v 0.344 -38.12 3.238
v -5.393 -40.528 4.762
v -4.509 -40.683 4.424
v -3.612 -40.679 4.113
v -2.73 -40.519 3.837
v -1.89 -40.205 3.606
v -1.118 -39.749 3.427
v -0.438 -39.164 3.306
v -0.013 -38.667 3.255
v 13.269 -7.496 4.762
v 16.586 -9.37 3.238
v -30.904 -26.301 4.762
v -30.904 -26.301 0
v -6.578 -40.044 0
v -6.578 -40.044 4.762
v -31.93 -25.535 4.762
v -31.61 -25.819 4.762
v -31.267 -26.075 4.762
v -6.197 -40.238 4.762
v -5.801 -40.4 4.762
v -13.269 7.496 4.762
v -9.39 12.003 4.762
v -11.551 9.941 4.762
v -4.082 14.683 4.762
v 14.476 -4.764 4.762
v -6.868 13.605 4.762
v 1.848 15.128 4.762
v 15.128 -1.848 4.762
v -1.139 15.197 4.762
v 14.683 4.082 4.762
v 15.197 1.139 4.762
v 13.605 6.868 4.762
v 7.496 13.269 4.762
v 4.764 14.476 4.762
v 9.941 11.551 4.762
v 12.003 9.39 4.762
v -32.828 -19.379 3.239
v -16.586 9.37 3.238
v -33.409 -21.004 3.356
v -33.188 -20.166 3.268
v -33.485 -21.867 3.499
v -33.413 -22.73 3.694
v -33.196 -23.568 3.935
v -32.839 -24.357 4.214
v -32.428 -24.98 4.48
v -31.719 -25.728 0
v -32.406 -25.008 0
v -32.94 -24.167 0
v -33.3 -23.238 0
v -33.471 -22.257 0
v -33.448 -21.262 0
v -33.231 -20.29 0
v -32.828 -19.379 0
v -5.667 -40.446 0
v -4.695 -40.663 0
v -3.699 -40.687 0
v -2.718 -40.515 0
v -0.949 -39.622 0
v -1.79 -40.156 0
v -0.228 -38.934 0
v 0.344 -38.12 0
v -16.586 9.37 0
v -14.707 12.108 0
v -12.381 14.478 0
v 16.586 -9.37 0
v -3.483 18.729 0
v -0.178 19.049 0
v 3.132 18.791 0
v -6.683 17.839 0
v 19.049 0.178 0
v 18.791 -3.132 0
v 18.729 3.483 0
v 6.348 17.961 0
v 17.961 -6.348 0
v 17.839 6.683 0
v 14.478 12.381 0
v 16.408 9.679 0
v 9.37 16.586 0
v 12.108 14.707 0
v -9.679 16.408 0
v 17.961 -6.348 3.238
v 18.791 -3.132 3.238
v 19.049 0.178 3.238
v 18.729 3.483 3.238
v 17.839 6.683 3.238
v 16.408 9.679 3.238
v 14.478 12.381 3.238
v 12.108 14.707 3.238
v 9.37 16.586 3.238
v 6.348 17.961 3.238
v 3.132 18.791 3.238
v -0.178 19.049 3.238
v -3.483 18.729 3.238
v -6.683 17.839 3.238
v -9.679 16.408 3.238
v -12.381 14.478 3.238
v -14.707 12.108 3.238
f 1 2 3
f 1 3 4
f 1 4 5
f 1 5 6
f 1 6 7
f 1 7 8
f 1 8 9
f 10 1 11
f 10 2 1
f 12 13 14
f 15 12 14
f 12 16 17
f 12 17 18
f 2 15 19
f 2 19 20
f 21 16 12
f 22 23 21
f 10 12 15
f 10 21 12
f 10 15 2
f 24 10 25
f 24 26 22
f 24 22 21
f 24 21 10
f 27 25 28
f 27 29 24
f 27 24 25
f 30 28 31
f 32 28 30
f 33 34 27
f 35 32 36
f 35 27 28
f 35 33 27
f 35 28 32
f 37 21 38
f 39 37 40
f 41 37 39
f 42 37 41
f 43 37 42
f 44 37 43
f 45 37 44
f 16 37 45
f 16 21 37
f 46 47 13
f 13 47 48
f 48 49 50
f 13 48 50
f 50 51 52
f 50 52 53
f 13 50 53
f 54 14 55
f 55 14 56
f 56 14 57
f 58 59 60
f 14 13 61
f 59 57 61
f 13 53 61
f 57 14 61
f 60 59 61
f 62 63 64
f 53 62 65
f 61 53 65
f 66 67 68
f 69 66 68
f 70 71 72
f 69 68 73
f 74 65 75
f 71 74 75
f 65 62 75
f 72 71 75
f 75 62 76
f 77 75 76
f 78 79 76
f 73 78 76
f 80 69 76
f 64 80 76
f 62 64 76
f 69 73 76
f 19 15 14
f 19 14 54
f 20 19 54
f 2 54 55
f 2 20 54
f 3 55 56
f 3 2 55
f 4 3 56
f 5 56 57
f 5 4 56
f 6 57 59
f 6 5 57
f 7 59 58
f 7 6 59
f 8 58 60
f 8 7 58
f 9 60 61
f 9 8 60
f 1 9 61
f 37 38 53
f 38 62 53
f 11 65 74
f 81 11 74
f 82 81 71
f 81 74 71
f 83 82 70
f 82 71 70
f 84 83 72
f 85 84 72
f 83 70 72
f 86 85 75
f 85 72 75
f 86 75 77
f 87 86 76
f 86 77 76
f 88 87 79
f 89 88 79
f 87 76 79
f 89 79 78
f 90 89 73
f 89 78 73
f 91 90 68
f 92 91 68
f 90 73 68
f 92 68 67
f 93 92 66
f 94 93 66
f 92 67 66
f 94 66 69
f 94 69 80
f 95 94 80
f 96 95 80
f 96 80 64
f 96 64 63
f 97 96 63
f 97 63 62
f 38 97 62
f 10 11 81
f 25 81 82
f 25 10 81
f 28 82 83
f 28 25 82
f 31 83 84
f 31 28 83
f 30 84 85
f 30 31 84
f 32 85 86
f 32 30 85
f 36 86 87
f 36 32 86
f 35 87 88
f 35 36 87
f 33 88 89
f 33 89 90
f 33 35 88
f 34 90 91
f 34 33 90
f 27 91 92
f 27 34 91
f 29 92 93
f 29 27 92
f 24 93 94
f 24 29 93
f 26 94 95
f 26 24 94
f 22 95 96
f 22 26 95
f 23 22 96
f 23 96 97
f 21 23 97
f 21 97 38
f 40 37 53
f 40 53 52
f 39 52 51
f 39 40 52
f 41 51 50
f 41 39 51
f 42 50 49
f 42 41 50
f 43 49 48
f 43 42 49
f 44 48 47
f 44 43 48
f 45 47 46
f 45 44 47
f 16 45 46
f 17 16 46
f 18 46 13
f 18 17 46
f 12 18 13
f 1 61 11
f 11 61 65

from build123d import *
from OCP.BRepFilletAPI import BRepFilletAPI_MakeChamfer

# Parameters (mm, degrees)
BOSS_EXTRUDE1_DEPTH = 4.7625
CHAMFER1_SIZE       = 1.524
CHAMFER1_SIZE2      = 3.81
FILLET1_R           = 5.08


with BuildPart() as part:
    # Sketch1 → Boss-Extrude1 (new body)
    with BuildSketch(Plane.XY):
        with BuildLine():
            Line((-16.586093498, 9.370378993), (-35.326851484, -23.801808003))
            Line((-35.326851484, -23.801808003), (-2.154664488, -42.542565989))
            Line((-2.154664488, -42.542565989), (16.586093498, -9.370378993))
            ThreePointArc((16.586093498, -9.370378993), (9.370378993, 16.586093498), (-16.586093498, 9.370378993))
        make_face()
    extrude(amount=BOSS_EXTRUDE1_DEPTH)

    # Chamfer1: one chamfer whose edges measure the first distance from different faces: ONE call of the kernel's chamfer builder (chamfer() names one face for all edges)
    chamfer1_edges_1 = [part.edges().sort_by_distance(p)[0] for p in [
        (7.215714505, -25.956472491, 4.7625),
    ]]
    chamfer1_side_1 = [part.faces().sort_by_distance(p)[0] for p in [
        (7.215714505, -25.956472491, 2.38125),
    ]]
    chamfer1_edges_2 = [part.edges().sort_by_distance(p)[0] for p in [
        (9.370378993, 16.586093498, 4.7625),
    ]]
    chamfer1_side_2 = [part.faces().sort_by_distance(p)[0] for p in [
        (9.370378993, 16.586093498, 2.38125),
    ]]
    chamfer1_edges_3 = [part.edges().sort_by_distance(p)[0] for p in [
        (-25.956472491, -7.215714505, 4.7625),
    ]]
    chamfer1_side_3 = [part.faces().sort_by_distance(p)[0] for p in [
        (-25.956472491, -7.215714505, 2.38125),
    ]]
    chamfer1 = BRepFilletAPI_MakeChamfer(part.part.solid().wrapped)
    for e in chamfer1_edges_1:
        chamfer1.Add(CHAMFER1_SIZE, CHAMFER1_SIZE2, e.wrapped, chamfer1_side_1[0].wrapped)  # the first distance lies on this face
    for e in chamfer1_edges_2:
        chamfer1.Add(CHAMFER1_SIZE, CHAMFER1_SIZE2, e.wrapped, chamfer1_side_2[0].wrapped)  # the first distance lies on this face
    for e in chamfer1_edges_3:
        chamfer1.Add(CHAMFER1_SIZE, CHAMFER1_SIZE2, e.wrapped, chamfer1_side_3[0].wrapped)  # the first distance lies on this face
    add(Compound.cast(chamfer1.Shape()), mode=Mode.REPLACE)

    # Fillet1
    fillet1_edges = [part.edges().sort_by_distance(p)[0] for p in [
        (-35.326851484, -23.801808003, 1.61925),
        (-2.154664488, -42.542565989, 1.61925),
    ]]
    fillet(fillet1_edges, radius=FILLET1_R)


solid = part.part
